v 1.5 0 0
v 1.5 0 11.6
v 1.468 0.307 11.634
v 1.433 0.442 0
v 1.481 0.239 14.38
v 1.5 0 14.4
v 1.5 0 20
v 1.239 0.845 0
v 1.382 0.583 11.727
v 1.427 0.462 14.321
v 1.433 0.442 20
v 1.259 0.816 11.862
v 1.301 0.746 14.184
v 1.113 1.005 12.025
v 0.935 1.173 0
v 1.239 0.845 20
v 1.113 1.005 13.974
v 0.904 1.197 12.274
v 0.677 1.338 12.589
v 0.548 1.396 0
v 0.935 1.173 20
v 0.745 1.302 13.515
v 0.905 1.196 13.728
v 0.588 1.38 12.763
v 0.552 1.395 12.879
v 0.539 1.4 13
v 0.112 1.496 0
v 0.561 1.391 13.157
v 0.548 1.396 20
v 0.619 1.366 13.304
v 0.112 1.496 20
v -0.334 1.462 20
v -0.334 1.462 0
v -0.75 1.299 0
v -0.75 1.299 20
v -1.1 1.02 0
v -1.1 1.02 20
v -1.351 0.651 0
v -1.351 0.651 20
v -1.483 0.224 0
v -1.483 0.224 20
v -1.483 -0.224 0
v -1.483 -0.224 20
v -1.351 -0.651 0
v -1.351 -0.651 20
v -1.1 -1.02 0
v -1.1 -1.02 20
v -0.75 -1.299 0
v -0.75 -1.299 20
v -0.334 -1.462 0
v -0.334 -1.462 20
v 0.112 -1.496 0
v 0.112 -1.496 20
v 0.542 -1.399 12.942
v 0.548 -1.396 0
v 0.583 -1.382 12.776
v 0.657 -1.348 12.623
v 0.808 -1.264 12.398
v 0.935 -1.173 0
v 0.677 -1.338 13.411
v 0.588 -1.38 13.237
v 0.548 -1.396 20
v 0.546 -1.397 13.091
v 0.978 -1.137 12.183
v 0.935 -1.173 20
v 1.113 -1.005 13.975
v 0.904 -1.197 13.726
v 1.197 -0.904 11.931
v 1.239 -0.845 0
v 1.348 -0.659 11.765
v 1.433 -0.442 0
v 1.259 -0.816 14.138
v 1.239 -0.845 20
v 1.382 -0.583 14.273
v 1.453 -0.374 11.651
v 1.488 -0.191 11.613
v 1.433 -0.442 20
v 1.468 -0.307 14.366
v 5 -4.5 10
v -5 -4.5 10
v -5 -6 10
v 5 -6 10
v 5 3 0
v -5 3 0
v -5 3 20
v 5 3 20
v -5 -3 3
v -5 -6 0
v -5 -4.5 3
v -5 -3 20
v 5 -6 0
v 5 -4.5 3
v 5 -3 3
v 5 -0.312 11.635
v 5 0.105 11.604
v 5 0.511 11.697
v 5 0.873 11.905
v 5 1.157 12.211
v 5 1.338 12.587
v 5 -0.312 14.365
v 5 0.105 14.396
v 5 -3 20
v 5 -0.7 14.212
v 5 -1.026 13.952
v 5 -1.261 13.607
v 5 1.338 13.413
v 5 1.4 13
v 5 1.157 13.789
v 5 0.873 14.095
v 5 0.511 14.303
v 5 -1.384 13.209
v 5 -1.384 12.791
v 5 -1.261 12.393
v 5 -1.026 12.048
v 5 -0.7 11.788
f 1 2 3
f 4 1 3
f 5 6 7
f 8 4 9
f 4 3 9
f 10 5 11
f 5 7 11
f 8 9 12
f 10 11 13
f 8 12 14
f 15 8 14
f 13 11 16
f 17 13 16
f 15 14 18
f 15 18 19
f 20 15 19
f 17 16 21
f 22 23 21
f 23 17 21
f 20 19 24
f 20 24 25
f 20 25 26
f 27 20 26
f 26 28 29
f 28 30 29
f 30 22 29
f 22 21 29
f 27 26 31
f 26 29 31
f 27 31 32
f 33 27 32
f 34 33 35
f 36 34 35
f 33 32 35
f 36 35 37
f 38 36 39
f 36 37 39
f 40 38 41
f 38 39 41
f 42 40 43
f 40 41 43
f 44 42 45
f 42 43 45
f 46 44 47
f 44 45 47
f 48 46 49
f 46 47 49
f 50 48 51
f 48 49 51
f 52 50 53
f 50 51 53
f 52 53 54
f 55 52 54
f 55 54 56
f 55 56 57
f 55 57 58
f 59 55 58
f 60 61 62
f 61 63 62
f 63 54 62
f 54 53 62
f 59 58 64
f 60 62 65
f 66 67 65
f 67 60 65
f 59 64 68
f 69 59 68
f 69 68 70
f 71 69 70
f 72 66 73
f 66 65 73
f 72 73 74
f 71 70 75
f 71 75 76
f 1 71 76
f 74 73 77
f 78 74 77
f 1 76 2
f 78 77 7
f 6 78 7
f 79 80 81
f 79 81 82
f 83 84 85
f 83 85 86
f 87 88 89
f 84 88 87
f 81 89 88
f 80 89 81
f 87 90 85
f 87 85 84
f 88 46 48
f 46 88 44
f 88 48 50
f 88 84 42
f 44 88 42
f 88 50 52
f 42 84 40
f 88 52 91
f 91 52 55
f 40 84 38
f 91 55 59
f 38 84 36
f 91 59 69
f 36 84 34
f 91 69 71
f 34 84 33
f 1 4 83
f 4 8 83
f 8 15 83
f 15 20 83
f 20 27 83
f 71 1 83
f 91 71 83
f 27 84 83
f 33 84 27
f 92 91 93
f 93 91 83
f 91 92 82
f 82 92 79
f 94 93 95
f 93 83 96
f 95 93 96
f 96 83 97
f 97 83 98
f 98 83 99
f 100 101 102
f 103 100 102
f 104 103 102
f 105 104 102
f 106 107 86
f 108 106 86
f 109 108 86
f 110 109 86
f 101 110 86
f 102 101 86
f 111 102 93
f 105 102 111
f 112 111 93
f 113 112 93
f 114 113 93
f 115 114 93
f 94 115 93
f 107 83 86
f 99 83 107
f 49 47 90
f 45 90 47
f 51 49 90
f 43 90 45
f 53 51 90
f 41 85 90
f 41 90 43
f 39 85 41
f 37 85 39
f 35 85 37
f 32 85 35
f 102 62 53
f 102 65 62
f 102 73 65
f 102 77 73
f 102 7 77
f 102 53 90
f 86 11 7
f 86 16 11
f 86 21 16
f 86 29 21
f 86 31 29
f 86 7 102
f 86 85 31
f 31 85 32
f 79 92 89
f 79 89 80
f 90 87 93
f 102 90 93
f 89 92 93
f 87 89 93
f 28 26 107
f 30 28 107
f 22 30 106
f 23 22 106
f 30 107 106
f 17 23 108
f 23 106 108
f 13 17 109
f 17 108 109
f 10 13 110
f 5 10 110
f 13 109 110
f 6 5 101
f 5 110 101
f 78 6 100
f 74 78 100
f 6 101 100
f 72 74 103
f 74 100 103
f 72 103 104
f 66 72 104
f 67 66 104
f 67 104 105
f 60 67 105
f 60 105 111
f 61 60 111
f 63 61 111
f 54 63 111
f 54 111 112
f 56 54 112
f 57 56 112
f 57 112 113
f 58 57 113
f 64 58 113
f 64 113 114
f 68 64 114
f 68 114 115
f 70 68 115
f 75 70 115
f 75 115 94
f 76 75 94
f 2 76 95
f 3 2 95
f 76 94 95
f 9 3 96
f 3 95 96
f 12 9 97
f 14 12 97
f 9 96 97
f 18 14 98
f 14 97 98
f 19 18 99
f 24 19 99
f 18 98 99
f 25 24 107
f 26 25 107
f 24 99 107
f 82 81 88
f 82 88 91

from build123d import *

# Parameters (mm, degrees)
SKETCH_W        = 10
SKETCH_H        = 6
PAD_DEPTH       = 20
SKETCH001_R     = 1.5
POCKET_DEPTH    = 20.001
SKETCH002_W     = 10
SKETCH002_H     = 0.01
POCKET001_DEPTH = 20.001
SKETCH003_W     = 10
SKETCH003_H     = 10
PAD001_DEPTH    = 3
SKETCH004_W     = 1.5
SKETCH004_H     = 7
POCKET002_DEPTH = 10.001
SKETCH005_R     = 1.4
POCKET003_DEPTH = 5


with BuildPart() as part:
    # Sketch → Pad (new body)
    with BuildSketch(Plane.XY):
        Rectangle(SKETCH_W, SKETCH_H)
    extrude(amount=PAD_DEPTH)

    # Sketch001 (on Face6 of Pad) → Pocket (cut, through all)
    with BuildSketch(Plane.XY.offset(20)):
        Circle(SKETCH001_R)
    extrude(amount=-POCKET_DEPTH, mode=Mode.SUBTRACT)

    # Sketch002 (on Face5 of Pocket) → Pocket001 (cut, through all)
    with BuildSketch(Plane.XY.offset(20)):
        with Locations((0, 3.005)):
            Rectangle(SKETCH002_W, SKETCH002_H)
    extrude(amount=-POCKET001_DEPTH, mode=Mode.SUBTRACT)

    # Sketch003 (on Face1 of Pocket001) → Pad001 (join)
    with BuildSketch(Plane.XZ.offset(3)):
        with Locations((0, 5)):
            Rectangle(SKETCH003_W, SKETCH003_H)
    extrude(amount=PAD001_DEPTH)

    # Sketch004 (on Face6 of Pad001) → Pocket002 (cut, through all)
    with BuildSketch(Plane.YZ.offset(5)):
        with Locations((-3.75, 6.5)):
            Rectangle(SKETCH004_W, SKETCH004_H)
    extrude(amount=-POCKET002_DEPTH, mode=Mode.SUBTRACT)

    # Sketch005 (on Face3 of Pocket002) → Pocket003 (cut)
    with BuildSketch(Plane.YZ.offset(5)):
        with Locations((0, 13)):
            Circle(SKETCH005_R)
    extrude(amount=-POCKET003_DEPTH, mode=Mode.SUBTRACT)


solid = part.part
